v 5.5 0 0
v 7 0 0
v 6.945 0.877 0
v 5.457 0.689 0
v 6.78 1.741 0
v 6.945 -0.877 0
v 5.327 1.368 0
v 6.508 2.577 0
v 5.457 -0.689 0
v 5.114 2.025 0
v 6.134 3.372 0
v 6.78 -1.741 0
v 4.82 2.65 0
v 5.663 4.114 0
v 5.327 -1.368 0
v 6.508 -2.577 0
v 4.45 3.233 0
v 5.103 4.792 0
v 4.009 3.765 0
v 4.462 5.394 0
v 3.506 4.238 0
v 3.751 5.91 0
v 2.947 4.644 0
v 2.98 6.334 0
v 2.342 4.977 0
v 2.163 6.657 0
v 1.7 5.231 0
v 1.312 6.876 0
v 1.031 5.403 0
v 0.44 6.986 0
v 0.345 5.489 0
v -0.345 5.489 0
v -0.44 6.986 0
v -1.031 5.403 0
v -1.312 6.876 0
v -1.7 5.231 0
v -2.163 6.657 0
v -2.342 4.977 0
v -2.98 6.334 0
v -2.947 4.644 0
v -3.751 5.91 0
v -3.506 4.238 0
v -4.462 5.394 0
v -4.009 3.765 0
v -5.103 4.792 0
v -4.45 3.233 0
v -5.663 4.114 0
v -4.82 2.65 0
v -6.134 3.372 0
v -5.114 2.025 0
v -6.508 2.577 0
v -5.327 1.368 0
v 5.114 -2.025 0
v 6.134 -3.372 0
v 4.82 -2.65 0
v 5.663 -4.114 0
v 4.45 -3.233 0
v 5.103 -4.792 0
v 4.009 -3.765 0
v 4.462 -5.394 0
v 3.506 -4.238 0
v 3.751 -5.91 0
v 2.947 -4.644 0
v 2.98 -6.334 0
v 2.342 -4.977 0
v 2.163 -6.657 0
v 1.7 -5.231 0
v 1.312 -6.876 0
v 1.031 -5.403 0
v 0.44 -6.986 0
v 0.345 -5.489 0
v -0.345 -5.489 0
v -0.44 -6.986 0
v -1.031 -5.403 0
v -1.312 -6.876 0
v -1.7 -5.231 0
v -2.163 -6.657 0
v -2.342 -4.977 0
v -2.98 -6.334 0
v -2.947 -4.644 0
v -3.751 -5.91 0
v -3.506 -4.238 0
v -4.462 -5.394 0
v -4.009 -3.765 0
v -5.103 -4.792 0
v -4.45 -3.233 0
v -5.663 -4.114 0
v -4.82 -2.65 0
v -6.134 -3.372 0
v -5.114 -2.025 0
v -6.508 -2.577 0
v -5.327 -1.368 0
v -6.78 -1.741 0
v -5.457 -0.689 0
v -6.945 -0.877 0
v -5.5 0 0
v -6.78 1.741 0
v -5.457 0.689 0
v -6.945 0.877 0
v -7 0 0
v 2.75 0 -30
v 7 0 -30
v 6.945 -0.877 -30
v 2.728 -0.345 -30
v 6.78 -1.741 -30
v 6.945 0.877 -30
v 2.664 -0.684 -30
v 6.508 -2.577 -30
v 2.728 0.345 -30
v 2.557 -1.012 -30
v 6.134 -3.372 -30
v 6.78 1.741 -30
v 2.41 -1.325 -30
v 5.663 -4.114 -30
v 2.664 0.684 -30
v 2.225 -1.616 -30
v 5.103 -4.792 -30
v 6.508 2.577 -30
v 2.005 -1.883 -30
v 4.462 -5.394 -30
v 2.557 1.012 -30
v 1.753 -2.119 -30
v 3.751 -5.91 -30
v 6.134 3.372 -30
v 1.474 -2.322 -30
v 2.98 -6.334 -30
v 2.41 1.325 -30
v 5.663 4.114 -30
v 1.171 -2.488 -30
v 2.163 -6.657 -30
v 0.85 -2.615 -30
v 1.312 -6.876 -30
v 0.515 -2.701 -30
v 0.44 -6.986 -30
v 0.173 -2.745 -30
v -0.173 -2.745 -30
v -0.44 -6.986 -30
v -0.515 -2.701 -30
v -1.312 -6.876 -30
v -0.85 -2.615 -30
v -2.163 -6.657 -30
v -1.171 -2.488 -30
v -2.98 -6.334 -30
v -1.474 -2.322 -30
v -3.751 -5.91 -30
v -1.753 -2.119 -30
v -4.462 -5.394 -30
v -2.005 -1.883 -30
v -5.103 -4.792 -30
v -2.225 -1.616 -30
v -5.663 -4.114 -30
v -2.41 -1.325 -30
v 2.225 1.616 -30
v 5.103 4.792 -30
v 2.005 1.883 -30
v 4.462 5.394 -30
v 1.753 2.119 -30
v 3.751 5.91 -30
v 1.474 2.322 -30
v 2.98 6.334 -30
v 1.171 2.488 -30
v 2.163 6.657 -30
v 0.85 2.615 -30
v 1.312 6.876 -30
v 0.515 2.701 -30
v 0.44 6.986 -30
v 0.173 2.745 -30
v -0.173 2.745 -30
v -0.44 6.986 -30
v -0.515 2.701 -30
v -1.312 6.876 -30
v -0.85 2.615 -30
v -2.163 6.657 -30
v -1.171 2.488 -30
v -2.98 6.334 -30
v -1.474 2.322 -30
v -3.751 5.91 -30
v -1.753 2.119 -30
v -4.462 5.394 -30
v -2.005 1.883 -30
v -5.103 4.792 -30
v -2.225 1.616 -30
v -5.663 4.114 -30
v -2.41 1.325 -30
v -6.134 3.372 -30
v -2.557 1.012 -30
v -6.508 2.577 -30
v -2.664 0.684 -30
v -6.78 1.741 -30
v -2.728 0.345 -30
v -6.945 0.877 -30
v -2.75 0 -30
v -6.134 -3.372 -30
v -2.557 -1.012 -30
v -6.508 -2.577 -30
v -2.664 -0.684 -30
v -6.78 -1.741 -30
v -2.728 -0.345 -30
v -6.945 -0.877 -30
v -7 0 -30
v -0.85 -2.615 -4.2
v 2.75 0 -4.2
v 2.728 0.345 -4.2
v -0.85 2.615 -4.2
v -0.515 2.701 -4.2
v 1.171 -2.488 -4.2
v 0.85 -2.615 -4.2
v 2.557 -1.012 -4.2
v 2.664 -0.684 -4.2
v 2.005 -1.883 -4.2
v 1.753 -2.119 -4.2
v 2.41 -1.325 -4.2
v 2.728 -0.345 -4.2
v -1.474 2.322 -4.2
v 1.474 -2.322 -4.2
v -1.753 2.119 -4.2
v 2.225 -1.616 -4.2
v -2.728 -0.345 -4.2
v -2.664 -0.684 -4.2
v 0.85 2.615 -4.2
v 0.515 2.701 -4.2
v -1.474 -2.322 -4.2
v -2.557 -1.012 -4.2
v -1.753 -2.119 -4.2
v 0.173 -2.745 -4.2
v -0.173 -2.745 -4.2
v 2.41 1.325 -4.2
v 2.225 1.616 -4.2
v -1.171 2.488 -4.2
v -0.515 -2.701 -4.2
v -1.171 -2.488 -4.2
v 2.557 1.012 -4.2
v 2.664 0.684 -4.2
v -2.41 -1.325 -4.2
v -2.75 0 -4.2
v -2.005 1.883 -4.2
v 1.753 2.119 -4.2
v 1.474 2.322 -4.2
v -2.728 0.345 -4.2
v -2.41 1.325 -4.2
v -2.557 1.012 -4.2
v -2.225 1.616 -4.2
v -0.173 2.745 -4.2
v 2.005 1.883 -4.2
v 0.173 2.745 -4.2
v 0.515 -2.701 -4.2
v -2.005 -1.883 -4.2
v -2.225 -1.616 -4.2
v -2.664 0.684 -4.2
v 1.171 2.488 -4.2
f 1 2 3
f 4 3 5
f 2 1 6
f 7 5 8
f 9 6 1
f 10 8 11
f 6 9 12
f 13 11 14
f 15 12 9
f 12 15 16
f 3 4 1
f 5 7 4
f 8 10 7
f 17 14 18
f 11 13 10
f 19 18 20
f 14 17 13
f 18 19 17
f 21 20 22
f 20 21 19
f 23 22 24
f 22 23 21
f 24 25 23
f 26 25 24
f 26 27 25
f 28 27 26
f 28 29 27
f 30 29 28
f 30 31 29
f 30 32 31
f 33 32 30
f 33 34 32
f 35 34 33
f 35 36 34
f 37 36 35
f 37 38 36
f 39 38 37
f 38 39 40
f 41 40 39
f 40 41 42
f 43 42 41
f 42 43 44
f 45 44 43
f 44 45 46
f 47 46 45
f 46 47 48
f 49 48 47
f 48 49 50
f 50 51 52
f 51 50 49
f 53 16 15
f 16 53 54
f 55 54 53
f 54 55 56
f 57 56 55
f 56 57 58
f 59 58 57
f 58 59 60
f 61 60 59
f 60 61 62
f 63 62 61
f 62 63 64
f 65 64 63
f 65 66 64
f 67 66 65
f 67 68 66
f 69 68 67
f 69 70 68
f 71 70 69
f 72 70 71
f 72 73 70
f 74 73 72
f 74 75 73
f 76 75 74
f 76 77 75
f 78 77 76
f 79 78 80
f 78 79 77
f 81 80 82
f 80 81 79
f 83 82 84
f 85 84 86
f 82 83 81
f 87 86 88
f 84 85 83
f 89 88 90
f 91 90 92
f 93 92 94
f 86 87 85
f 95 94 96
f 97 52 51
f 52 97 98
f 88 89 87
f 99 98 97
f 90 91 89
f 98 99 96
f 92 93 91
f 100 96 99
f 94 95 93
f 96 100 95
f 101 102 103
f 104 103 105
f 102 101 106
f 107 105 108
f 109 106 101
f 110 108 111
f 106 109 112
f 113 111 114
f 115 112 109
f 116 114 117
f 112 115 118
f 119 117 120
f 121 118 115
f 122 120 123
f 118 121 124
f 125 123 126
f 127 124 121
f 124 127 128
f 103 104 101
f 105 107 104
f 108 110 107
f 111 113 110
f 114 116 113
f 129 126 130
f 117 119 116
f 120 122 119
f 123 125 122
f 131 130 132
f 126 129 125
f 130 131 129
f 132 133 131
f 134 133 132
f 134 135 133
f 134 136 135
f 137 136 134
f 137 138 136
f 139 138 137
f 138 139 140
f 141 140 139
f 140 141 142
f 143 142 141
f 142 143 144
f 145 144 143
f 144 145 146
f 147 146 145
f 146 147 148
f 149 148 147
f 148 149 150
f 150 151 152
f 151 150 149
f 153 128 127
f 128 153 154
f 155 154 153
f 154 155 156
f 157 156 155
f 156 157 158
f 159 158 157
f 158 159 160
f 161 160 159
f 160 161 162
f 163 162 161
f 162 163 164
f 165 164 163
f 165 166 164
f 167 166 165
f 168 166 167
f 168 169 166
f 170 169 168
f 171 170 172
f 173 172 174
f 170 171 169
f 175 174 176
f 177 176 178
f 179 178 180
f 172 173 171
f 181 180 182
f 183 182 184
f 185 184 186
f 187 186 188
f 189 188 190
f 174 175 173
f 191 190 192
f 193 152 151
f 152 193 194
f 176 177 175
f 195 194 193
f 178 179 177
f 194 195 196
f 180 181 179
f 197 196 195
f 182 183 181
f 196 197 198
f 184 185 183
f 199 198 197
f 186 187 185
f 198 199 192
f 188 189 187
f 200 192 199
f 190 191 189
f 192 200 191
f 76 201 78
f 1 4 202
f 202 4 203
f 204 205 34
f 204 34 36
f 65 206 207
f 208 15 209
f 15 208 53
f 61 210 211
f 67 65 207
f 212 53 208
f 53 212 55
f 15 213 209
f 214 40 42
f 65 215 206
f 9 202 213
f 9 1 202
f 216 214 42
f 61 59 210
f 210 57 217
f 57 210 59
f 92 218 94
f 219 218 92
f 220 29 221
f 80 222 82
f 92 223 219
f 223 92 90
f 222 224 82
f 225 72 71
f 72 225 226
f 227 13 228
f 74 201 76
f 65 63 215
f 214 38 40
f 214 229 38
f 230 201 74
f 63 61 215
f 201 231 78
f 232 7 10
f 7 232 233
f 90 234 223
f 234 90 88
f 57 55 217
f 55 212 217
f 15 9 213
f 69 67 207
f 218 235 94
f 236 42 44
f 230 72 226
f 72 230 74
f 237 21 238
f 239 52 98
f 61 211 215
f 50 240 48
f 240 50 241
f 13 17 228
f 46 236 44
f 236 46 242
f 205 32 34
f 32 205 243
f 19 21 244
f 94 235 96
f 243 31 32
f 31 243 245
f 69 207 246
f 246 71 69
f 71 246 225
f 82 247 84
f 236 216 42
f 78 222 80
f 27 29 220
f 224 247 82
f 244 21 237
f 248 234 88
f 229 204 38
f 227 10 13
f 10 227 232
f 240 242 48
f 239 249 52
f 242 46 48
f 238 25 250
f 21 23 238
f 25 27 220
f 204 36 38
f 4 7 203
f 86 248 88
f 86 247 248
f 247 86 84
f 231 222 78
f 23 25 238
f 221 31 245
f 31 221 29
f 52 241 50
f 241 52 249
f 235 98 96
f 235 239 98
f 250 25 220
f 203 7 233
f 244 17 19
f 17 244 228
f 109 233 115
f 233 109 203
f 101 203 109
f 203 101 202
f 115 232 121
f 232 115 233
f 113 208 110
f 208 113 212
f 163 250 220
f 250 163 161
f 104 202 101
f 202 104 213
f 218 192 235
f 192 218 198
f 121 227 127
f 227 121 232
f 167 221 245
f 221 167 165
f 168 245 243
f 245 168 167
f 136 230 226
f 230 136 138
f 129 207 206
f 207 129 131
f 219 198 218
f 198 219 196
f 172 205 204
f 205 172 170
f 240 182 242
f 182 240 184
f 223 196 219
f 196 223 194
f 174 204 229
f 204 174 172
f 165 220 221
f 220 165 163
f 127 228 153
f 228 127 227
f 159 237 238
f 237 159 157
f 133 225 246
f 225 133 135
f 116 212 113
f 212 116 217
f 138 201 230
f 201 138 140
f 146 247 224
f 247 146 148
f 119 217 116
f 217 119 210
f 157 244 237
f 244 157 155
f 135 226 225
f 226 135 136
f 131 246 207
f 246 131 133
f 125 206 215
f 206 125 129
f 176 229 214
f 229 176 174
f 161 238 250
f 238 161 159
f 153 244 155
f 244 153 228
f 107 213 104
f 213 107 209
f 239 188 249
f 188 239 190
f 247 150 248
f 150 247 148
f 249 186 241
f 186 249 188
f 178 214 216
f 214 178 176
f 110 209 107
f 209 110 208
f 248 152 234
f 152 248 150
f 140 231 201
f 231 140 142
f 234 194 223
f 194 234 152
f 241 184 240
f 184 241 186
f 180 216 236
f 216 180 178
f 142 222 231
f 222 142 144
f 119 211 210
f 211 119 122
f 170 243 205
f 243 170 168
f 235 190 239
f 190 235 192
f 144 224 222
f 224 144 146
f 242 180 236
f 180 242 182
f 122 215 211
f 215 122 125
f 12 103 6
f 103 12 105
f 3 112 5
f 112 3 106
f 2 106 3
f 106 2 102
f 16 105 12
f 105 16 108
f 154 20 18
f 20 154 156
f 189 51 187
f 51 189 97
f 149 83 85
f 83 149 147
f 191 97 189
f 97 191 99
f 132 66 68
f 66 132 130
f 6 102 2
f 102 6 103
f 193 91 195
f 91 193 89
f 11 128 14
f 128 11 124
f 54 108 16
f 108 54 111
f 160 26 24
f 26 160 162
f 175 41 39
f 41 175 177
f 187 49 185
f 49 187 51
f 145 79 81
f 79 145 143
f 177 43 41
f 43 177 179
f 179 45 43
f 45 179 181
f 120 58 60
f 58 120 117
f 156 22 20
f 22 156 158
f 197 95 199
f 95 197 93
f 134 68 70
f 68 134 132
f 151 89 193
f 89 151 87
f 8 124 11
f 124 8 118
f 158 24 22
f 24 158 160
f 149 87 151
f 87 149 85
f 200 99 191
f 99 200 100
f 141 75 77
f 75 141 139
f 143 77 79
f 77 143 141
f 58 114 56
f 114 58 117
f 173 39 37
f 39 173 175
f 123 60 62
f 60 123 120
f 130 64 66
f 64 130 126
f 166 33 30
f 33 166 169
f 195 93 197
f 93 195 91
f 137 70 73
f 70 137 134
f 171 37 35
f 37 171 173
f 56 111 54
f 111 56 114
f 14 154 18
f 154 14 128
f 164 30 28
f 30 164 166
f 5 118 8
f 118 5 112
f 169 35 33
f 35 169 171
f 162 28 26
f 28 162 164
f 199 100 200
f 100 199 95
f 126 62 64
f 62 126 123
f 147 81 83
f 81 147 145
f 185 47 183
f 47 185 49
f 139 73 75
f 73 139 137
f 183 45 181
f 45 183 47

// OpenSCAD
$fn = 50;


difference() {
	union() {
		translate(v = [0, 0, -30.0000000000]) {
			cylinder(h = 30, r = 7.0000000000);
		}
		cylinder(h = 0, r = 16.0000000000);
	}
	union() {
		translate(v = [0, 0, 0]) {
			rotate(a = [0, 0, 0]) {
				difference() {
					union() {
						#translate(v = [0, 0, -30.0000000000]) {
							cylinder(h = 30, r = 2.2500000000);
						}
						#translate(v = [0, 0, -4.2000000000]) {
							cylinder(h = 4.2000000000, r1 = 2.7500000000, r2 = 5.5000000000);
						}
						#translate(v = [0, 0, -30.0000000000]) {
							cylinder(h = 30, r = 2.7500000000);
						}
						#translate(v = [0, 0, -30.0000000000]) {
							cylinder(h = 30, r = 2.2500000000);
						}
					}
					union();
				}
			}
		}
	}
}
